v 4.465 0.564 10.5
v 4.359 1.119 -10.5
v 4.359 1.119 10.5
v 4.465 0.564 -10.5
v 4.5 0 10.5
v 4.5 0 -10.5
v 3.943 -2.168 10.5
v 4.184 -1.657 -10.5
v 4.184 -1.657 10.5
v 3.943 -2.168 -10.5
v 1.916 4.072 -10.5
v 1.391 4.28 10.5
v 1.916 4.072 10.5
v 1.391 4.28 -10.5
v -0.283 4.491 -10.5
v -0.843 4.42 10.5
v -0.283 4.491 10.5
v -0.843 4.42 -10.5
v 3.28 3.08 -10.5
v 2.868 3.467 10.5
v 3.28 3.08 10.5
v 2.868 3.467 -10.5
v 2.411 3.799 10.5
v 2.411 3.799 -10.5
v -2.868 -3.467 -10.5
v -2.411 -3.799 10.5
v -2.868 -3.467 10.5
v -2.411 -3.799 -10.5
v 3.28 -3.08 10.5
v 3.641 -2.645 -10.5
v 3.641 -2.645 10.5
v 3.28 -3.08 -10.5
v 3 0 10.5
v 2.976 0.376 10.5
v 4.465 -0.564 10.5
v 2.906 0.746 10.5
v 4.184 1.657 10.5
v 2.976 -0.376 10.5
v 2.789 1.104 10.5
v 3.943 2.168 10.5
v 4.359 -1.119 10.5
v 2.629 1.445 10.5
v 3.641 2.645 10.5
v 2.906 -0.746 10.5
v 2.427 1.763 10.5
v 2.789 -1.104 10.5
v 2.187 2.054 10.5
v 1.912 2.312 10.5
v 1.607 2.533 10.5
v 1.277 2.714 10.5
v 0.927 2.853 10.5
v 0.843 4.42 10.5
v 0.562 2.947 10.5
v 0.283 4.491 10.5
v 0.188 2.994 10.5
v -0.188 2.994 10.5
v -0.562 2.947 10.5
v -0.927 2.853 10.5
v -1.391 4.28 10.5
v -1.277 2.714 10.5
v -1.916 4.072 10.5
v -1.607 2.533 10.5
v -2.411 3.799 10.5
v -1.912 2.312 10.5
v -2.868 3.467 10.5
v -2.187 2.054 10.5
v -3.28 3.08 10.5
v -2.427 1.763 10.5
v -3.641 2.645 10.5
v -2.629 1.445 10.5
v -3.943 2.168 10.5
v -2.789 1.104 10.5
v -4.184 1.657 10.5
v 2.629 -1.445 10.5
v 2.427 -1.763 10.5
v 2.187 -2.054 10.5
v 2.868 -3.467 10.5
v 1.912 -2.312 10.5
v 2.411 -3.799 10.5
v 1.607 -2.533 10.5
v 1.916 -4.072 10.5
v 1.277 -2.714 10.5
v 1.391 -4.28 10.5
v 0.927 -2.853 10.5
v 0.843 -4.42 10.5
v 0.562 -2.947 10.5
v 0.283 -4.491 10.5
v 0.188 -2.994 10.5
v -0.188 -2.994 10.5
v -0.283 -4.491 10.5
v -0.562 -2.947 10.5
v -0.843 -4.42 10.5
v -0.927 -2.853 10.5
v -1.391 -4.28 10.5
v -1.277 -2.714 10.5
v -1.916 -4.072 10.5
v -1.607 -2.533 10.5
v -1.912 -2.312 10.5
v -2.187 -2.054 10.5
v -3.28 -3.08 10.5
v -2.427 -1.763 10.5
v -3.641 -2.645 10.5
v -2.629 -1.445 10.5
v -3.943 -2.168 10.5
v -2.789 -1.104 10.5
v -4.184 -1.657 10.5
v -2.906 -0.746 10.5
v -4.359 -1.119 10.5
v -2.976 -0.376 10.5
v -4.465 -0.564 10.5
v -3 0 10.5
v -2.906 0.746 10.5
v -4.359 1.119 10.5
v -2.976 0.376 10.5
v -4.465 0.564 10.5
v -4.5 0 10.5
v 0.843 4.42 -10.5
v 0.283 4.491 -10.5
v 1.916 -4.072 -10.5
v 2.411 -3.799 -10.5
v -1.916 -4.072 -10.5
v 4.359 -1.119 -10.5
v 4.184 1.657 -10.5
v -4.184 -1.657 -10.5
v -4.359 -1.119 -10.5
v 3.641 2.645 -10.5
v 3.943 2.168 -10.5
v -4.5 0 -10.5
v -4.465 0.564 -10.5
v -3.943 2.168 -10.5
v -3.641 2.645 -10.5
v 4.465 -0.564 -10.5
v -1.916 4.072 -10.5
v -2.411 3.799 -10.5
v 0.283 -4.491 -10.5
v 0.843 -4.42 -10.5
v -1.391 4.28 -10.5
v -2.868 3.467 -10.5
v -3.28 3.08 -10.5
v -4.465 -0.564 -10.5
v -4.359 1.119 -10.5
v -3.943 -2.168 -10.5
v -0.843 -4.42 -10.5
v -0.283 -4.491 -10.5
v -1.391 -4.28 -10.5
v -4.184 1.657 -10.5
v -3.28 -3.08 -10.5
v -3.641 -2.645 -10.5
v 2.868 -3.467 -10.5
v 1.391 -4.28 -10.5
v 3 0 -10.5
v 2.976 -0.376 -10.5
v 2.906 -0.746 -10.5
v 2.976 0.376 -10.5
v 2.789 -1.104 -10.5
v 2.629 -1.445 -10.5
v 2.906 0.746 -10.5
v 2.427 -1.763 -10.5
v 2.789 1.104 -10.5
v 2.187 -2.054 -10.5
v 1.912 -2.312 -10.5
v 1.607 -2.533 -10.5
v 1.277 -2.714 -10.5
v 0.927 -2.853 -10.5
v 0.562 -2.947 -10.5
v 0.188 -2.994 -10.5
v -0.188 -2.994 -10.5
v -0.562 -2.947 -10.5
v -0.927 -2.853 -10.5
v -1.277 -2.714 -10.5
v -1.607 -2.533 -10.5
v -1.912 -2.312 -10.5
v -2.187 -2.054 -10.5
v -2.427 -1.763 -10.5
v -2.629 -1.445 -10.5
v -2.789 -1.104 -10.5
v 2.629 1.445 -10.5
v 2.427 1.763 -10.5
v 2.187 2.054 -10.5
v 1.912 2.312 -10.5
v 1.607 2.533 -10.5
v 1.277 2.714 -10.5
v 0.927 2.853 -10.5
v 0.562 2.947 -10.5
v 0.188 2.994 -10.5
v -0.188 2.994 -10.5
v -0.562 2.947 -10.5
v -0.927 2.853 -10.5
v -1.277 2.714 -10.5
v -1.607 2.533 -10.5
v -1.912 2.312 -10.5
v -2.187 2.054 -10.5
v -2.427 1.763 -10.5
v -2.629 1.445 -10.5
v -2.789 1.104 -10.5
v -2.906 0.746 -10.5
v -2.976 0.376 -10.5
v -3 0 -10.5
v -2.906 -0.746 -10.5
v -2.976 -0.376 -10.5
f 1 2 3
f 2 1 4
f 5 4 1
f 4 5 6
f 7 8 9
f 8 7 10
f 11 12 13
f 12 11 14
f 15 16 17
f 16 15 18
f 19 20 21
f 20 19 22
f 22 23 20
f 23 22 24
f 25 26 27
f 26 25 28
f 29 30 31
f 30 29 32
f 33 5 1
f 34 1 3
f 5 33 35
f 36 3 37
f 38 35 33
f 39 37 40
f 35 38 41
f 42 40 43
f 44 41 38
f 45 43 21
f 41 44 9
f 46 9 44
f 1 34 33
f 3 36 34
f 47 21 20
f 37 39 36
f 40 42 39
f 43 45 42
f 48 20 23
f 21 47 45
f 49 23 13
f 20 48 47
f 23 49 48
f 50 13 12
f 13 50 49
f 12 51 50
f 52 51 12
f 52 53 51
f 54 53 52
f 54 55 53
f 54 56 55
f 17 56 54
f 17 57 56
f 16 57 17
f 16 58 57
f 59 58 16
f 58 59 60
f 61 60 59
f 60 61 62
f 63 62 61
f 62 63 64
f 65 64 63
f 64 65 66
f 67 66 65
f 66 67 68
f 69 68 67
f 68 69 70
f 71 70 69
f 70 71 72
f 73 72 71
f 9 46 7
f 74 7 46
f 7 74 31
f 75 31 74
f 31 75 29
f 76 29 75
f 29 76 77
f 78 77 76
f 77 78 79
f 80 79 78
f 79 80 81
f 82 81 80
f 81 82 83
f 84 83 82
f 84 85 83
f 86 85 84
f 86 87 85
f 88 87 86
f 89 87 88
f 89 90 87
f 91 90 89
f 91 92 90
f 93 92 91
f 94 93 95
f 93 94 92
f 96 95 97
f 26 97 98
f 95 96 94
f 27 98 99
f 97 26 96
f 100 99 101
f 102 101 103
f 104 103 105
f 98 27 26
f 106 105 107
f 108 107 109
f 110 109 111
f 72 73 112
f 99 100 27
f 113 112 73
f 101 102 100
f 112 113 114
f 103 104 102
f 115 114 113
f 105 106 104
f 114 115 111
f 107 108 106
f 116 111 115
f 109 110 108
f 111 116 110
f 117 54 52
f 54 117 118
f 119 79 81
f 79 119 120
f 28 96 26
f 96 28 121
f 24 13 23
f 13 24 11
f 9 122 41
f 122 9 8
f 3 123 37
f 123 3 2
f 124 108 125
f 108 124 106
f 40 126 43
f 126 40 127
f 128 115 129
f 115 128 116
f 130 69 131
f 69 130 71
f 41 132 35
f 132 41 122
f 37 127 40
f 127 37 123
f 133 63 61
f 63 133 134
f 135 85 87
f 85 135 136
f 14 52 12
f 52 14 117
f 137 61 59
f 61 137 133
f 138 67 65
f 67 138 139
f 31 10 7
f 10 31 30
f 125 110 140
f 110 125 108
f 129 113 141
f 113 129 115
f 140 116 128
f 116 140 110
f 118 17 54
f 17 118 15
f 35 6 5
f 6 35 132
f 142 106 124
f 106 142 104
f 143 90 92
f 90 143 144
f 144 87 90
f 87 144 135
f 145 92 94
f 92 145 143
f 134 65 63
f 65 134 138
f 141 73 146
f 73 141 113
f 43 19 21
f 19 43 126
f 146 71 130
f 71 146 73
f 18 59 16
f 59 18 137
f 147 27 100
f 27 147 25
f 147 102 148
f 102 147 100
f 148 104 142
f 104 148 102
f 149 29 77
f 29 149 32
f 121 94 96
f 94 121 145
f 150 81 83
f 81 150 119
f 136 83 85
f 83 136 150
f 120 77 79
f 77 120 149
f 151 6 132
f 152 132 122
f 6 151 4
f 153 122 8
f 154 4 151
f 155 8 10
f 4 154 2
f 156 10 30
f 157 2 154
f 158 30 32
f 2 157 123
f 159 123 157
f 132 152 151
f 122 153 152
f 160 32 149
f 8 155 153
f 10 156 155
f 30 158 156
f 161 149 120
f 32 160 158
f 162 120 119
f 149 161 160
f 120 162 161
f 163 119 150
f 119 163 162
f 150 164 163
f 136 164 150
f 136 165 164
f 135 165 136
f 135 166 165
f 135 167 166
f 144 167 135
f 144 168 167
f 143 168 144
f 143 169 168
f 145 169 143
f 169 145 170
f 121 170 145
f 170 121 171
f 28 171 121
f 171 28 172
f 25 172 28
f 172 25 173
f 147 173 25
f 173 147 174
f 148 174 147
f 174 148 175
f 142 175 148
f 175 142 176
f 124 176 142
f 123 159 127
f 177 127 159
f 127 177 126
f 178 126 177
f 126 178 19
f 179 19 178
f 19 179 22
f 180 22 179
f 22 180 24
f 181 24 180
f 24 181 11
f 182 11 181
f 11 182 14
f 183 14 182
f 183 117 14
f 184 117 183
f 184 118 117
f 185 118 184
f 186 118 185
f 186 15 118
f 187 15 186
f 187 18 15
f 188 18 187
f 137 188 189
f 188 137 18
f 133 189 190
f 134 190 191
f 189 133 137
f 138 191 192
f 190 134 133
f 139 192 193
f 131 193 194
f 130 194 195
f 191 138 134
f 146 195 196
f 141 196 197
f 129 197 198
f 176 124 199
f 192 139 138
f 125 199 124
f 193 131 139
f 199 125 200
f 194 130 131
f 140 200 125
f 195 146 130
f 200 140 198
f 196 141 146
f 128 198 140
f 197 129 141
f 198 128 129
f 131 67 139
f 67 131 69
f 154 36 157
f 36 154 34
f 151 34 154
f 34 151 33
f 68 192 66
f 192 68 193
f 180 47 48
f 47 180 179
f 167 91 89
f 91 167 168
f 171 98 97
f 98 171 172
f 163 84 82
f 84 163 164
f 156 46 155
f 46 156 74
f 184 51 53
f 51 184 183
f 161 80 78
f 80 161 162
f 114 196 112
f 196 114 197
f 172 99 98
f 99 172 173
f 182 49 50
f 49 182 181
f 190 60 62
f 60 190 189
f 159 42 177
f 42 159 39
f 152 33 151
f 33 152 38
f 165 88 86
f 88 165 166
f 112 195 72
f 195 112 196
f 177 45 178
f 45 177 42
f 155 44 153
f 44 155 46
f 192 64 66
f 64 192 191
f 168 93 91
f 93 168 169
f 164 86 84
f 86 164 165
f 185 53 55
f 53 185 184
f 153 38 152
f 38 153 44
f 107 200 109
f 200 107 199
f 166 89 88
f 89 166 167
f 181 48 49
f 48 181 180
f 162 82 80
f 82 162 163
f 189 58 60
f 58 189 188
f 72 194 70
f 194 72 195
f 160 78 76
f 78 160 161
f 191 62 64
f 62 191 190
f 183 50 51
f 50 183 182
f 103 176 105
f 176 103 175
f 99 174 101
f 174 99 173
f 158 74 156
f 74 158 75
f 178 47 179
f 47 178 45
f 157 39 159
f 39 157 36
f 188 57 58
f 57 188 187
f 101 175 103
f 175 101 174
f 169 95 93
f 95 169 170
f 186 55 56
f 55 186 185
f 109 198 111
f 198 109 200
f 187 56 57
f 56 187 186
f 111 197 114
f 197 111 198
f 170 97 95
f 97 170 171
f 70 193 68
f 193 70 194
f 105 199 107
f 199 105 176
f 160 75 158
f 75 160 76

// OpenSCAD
$fn = 50;


difference() {
	union() {
		translate(v = [0, 0, -10.5000000000]) {
			cylinder(h = 21, r = 4.5000000000);
		}
	}
	union() {
		translate(v = [0, 0, -100.0000000000]) {
			cylinder(h = 200, r = 3.0000000000);
		}
	}
}
